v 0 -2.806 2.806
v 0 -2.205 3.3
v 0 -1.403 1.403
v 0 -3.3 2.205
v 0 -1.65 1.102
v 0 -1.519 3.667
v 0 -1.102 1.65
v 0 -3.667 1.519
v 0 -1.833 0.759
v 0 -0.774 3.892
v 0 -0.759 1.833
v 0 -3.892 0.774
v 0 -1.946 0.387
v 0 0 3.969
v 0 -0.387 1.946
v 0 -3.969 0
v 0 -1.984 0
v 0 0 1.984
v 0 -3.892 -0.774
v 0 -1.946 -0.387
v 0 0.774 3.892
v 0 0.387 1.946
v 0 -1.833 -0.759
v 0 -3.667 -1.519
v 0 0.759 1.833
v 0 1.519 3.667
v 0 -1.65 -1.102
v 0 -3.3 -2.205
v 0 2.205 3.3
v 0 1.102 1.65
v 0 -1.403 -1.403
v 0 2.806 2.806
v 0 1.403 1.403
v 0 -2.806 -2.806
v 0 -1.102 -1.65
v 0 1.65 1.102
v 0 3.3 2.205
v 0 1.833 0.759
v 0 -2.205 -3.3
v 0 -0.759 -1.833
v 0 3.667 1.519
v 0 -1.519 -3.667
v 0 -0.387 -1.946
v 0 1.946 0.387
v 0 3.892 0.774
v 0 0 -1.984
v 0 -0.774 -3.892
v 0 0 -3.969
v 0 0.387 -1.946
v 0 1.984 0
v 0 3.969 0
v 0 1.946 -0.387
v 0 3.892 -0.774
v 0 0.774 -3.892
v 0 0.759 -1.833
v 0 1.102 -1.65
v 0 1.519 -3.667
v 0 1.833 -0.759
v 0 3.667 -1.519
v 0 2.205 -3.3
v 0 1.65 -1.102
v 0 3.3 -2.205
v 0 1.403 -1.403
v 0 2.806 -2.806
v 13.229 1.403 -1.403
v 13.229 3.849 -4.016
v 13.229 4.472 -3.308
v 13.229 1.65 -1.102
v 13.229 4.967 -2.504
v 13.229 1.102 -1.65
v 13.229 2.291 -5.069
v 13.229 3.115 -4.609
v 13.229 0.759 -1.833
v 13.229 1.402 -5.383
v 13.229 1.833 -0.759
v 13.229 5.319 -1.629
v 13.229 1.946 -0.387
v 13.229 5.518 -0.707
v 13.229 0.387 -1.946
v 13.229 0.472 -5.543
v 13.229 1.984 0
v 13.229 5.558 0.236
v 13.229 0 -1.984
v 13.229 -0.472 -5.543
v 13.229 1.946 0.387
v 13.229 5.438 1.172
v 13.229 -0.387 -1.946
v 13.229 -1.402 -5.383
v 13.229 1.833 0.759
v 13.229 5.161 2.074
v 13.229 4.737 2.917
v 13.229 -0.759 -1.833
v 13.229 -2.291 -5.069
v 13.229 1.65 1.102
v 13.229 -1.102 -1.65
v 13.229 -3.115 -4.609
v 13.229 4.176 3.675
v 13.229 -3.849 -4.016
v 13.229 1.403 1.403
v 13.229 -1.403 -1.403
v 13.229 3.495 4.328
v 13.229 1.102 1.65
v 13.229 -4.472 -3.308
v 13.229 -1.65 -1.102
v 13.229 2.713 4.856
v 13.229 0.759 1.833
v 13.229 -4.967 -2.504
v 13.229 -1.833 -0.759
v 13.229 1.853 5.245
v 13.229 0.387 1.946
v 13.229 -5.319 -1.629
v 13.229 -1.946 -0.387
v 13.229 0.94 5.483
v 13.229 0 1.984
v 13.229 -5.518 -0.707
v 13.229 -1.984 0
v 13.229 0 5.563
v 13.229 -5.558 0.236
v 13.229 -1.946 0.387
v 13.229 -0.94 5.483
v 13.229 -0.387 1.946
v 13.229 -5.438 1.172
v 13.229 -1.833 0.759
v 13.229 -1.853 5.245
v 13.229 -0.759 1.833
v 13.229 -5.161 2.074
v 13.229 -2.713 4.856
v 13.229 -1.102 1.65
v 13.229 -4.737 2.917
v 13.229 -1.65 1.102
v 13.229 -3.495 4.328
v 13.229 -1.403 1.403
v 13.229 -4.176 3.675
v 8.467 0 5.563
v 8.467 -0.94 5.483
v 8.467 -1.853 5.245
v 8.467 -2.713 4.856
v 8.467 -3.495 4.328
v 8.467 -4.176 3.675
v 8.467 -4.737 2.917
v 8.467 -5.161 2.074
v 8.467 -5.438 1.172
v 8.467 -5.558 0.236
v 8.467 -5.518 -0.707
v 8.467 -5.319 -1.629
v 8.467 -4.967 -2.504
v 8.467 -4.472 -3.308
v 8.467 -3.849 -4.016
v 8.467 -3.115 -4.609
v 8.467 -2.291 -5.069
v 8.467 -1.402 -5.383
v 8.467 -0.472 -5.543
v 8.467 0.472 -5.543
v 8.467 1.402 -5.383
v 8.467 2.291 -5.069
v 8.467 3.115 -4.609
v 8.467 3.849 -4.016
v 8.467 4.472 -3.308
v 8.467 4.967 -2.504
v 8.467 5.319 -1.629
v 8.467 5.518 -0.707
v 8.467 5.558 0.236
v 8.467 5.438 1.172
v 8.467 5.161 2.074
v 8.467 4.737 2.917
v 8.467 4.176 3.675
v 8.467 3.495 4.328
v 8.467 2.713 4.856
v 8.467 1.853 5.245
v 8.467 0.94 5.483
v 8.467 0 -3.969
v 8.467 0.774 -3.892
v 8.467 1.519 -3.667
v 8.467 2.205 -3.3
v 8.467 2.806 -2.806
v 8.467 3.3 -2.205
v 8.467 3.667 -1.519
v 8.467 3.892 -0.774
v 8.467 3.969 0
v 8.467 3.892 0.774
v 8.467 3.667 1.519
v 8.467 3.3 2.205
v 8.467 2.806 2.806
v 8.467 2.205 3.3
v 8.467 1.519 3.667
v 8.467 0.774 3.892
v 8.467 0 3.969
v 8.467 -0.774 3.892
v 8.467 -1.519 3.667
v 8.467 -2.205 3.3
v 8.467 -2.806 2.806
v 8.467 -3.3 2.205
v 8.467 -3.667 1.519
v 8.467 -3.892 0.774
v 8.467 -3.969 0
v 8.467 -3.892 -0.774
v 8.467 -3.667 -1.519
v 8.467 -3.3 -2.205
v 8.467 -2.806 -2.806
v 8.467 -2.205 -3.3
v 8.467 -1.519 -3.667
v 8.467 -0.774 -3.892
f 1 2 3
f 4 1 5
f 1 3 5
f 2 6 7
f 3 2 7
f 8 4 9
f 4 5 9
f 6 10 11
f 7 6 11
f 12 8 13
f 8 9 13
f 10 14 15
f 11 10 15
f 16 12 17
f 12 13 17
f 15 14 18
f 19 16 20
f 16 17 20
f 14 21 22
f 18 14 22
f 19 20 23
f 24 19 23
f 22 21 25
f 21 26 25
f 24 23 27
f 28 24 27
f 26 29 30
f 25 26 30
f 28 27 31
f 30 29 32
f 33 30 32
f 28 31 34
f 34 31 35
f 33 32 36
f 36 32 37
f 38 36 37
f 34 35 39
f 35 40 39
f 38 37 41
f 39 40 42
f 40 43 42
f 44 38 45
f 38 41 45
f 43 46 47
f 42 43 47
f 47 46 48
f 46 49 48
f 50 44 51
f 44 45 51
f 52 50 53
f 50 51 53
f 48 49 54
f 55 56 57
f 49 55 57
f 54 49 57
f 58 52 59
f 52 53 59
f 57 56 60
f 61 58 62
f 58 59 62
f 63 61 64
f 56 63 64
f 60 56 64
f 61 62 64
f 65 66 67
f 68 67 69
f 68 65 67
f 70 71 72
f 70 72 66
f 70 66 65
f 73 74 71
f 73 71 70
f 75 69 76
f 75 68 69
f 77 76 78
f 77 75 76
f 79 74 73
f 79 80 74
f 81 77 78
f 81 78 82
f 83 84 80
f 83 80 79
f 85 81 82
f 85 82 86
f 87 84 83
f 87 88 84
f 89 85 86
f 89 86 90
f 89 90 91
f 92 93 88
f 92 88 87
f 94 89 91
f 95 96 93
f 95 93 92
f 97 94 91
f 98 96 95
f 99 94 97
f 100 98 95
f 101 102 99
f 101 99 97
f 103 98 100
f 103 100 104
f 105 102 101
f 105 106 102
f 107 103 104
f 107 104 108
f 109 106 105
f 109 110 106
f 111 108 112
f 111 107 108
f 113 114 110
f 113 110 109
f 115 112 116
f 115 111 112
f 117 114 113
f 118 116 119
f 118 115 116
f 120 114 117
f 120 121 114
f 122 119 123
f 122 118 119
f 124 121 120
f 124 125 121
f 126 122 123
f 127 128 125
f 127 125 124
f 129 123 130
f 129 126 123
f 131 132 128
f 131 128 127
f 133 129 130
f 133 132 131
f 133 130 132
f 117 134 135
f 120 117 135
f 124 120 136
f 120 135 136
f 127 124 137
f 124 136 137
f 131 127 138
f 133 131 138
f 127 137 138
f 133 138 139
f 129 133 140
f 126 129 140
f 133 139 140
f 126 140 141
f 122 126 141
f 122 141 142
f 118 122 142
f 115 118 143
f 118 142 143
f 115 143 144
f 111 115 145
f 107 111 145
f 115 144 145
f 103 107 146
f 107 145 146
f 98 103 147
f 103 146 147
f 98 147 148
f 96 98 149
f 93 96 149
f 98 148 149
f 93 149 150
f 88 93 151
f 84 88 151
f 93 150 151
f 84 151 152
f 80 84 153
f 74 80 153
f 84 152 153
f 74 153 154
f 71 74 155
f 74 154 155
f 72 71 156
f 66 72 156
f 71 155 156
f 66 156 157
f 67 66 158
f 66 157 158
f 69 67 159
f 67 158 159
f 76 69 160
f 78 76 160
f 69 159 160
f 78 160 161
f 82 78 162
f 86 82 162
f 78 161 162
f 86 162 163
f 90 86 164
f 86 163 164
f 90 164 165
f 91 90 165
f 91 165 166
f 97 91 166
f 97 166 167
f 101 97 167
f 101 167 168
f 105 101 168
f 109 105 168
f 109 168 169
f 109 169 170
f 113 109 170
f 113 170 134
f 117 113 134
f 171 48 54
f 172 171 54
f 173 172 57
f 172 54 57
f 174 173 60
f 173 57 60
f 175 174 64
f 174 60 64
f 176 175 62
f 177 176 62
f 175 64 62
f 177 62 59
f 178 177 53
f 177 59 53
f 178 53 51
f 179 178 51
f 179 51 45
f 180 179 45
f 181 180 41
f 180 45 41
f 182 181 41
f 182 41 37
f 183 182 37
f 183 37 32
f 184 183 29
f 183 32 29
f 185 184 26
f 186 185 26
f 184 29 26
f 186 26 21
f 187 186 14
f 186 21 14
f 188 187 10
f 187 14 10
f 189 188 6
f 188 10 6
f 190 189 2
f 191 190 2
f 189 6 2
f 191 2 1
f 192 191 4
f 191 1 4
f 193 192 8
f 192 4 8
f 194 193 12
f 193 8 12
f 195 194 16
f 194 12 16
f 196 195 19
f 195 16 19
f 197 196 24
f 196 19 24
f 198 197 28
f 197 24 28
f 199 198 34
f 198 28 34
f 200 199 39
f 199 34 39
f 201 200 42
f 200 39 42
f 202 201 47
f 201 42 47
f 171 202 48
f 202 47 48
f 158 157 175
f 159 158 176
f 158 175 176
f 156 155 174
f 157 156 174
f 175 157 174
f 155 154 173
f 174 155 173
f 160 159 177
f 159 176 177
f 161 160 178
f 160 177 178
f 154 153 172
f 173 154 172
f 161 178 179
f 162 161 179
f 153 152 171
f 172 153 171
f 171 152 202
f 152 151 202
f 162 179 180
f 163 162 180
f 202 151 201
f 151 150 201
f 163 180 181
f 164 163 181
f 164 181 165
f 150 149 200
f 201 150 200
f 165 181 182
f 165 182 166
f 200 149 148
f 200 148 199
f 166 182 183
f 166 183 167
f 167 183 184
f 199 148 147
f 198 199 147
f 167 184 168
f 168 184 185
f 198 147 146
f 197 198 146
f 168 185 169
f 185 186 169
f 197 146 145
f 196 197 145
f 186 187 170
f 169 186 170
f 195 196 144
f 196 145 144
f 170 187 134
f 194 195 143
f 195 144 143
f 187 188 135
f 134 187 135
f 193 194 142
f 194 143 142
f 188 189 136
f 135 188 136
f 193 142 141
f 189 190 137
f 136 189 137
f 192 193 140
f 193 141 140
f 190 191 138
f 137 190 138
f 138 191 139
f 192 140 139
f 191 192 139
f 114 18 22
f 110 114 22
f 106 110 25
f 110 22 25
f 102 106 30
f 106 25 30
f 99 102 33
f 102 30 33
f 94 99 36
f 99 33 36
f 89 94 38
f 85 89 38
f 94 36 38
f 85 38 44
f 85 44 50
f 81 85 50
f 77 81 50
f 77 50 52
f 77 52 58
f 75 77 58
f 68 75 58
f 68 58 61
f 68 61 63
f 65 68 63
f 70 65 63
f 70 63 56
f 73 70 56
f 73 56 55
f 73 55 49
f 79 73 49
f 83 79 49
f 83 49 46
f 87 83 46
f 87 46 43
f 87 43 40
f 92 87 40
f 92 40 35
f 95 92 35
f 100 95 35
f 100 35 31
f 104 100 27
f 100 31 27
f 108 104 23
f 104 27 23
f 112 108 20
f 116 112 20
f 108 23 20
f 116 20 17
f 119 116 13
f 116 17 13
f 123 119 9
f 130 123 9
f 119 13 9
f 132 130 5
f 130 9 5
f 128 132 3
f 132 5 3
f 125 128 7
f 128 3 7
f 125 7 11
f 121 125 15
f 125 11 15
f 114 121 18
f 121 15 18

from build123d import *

# Parameters (mm, degrees)
SKETCH1_R                           = 3.96875
BOSS_EXTRUDE1_DEPTH                 = 8.466666667
SKETCH2_R                           = 5.5626
BOSS_EXTRUDE2_DEPTH                 = 4.7625
F_5_32_0_15625_DIAMETER_HOLE1_D     = 3.96875
F_5_32_0_15625_DIAMETER_HOLE1_DEPTH = 70.104
F_5_32_0_15625_DIAMETER_HOLE1_TIP   = 1.192332791


with BuildPart() as part:
    # Sketch1 → Boss-Extrude1 (new body)
    with BuildSketch(Plane(origin=(0, 0, 0), x_dir=(0, 0, -1), z_dir=(1, 0, 0))):
        Circle(SKETCH1_R)
    extrude(amount=BOSS_EXTRUDE1_DEPTH)

    # Sketch2 → Boss-Extrude2 (add)
    with BuildSketch(Plane(origin=(8.466666667, 0, 0), x_dir=(0, 0, -1), z_dir=(1, 0, 0))):
        with Locations(Location((0, 0, 0), (0, 0, 180))):
            Circle(SKETCH2_R)
    extrude(amount=BOSS_EXTRUDE2_DEPTH)

    # 5/32 (0.15625) Diameter Hole1
    with Locations(Plane(origin=(13.229166667, 0, 0), x_dir=(0, 0, -1), z_dir=(1, 0, 0))):
        with Locations((0, 0)):
            Hole(F_5_32_0_15625_DIAMETER_HOLE1_D / 2, depth=F_5_32_0_15625_DIAMETER_HOLE1_DEPTH)
            with Locations((0, 0, -(F_5_32_0_15625_DIAMETER_HOLE1_DEPTH + F_5_32_0_15625_DIAMETER_HOLE1_TIP / 2))):  # 118° drill point
                Cone(0, F_5_32_0_15625_DIAMETER_HOLE1_D / 2, F_5_32_0_15625_DIAMETER_HOLE1_TIP, mode=Mode.SUBTRACT)


solid = part.part
